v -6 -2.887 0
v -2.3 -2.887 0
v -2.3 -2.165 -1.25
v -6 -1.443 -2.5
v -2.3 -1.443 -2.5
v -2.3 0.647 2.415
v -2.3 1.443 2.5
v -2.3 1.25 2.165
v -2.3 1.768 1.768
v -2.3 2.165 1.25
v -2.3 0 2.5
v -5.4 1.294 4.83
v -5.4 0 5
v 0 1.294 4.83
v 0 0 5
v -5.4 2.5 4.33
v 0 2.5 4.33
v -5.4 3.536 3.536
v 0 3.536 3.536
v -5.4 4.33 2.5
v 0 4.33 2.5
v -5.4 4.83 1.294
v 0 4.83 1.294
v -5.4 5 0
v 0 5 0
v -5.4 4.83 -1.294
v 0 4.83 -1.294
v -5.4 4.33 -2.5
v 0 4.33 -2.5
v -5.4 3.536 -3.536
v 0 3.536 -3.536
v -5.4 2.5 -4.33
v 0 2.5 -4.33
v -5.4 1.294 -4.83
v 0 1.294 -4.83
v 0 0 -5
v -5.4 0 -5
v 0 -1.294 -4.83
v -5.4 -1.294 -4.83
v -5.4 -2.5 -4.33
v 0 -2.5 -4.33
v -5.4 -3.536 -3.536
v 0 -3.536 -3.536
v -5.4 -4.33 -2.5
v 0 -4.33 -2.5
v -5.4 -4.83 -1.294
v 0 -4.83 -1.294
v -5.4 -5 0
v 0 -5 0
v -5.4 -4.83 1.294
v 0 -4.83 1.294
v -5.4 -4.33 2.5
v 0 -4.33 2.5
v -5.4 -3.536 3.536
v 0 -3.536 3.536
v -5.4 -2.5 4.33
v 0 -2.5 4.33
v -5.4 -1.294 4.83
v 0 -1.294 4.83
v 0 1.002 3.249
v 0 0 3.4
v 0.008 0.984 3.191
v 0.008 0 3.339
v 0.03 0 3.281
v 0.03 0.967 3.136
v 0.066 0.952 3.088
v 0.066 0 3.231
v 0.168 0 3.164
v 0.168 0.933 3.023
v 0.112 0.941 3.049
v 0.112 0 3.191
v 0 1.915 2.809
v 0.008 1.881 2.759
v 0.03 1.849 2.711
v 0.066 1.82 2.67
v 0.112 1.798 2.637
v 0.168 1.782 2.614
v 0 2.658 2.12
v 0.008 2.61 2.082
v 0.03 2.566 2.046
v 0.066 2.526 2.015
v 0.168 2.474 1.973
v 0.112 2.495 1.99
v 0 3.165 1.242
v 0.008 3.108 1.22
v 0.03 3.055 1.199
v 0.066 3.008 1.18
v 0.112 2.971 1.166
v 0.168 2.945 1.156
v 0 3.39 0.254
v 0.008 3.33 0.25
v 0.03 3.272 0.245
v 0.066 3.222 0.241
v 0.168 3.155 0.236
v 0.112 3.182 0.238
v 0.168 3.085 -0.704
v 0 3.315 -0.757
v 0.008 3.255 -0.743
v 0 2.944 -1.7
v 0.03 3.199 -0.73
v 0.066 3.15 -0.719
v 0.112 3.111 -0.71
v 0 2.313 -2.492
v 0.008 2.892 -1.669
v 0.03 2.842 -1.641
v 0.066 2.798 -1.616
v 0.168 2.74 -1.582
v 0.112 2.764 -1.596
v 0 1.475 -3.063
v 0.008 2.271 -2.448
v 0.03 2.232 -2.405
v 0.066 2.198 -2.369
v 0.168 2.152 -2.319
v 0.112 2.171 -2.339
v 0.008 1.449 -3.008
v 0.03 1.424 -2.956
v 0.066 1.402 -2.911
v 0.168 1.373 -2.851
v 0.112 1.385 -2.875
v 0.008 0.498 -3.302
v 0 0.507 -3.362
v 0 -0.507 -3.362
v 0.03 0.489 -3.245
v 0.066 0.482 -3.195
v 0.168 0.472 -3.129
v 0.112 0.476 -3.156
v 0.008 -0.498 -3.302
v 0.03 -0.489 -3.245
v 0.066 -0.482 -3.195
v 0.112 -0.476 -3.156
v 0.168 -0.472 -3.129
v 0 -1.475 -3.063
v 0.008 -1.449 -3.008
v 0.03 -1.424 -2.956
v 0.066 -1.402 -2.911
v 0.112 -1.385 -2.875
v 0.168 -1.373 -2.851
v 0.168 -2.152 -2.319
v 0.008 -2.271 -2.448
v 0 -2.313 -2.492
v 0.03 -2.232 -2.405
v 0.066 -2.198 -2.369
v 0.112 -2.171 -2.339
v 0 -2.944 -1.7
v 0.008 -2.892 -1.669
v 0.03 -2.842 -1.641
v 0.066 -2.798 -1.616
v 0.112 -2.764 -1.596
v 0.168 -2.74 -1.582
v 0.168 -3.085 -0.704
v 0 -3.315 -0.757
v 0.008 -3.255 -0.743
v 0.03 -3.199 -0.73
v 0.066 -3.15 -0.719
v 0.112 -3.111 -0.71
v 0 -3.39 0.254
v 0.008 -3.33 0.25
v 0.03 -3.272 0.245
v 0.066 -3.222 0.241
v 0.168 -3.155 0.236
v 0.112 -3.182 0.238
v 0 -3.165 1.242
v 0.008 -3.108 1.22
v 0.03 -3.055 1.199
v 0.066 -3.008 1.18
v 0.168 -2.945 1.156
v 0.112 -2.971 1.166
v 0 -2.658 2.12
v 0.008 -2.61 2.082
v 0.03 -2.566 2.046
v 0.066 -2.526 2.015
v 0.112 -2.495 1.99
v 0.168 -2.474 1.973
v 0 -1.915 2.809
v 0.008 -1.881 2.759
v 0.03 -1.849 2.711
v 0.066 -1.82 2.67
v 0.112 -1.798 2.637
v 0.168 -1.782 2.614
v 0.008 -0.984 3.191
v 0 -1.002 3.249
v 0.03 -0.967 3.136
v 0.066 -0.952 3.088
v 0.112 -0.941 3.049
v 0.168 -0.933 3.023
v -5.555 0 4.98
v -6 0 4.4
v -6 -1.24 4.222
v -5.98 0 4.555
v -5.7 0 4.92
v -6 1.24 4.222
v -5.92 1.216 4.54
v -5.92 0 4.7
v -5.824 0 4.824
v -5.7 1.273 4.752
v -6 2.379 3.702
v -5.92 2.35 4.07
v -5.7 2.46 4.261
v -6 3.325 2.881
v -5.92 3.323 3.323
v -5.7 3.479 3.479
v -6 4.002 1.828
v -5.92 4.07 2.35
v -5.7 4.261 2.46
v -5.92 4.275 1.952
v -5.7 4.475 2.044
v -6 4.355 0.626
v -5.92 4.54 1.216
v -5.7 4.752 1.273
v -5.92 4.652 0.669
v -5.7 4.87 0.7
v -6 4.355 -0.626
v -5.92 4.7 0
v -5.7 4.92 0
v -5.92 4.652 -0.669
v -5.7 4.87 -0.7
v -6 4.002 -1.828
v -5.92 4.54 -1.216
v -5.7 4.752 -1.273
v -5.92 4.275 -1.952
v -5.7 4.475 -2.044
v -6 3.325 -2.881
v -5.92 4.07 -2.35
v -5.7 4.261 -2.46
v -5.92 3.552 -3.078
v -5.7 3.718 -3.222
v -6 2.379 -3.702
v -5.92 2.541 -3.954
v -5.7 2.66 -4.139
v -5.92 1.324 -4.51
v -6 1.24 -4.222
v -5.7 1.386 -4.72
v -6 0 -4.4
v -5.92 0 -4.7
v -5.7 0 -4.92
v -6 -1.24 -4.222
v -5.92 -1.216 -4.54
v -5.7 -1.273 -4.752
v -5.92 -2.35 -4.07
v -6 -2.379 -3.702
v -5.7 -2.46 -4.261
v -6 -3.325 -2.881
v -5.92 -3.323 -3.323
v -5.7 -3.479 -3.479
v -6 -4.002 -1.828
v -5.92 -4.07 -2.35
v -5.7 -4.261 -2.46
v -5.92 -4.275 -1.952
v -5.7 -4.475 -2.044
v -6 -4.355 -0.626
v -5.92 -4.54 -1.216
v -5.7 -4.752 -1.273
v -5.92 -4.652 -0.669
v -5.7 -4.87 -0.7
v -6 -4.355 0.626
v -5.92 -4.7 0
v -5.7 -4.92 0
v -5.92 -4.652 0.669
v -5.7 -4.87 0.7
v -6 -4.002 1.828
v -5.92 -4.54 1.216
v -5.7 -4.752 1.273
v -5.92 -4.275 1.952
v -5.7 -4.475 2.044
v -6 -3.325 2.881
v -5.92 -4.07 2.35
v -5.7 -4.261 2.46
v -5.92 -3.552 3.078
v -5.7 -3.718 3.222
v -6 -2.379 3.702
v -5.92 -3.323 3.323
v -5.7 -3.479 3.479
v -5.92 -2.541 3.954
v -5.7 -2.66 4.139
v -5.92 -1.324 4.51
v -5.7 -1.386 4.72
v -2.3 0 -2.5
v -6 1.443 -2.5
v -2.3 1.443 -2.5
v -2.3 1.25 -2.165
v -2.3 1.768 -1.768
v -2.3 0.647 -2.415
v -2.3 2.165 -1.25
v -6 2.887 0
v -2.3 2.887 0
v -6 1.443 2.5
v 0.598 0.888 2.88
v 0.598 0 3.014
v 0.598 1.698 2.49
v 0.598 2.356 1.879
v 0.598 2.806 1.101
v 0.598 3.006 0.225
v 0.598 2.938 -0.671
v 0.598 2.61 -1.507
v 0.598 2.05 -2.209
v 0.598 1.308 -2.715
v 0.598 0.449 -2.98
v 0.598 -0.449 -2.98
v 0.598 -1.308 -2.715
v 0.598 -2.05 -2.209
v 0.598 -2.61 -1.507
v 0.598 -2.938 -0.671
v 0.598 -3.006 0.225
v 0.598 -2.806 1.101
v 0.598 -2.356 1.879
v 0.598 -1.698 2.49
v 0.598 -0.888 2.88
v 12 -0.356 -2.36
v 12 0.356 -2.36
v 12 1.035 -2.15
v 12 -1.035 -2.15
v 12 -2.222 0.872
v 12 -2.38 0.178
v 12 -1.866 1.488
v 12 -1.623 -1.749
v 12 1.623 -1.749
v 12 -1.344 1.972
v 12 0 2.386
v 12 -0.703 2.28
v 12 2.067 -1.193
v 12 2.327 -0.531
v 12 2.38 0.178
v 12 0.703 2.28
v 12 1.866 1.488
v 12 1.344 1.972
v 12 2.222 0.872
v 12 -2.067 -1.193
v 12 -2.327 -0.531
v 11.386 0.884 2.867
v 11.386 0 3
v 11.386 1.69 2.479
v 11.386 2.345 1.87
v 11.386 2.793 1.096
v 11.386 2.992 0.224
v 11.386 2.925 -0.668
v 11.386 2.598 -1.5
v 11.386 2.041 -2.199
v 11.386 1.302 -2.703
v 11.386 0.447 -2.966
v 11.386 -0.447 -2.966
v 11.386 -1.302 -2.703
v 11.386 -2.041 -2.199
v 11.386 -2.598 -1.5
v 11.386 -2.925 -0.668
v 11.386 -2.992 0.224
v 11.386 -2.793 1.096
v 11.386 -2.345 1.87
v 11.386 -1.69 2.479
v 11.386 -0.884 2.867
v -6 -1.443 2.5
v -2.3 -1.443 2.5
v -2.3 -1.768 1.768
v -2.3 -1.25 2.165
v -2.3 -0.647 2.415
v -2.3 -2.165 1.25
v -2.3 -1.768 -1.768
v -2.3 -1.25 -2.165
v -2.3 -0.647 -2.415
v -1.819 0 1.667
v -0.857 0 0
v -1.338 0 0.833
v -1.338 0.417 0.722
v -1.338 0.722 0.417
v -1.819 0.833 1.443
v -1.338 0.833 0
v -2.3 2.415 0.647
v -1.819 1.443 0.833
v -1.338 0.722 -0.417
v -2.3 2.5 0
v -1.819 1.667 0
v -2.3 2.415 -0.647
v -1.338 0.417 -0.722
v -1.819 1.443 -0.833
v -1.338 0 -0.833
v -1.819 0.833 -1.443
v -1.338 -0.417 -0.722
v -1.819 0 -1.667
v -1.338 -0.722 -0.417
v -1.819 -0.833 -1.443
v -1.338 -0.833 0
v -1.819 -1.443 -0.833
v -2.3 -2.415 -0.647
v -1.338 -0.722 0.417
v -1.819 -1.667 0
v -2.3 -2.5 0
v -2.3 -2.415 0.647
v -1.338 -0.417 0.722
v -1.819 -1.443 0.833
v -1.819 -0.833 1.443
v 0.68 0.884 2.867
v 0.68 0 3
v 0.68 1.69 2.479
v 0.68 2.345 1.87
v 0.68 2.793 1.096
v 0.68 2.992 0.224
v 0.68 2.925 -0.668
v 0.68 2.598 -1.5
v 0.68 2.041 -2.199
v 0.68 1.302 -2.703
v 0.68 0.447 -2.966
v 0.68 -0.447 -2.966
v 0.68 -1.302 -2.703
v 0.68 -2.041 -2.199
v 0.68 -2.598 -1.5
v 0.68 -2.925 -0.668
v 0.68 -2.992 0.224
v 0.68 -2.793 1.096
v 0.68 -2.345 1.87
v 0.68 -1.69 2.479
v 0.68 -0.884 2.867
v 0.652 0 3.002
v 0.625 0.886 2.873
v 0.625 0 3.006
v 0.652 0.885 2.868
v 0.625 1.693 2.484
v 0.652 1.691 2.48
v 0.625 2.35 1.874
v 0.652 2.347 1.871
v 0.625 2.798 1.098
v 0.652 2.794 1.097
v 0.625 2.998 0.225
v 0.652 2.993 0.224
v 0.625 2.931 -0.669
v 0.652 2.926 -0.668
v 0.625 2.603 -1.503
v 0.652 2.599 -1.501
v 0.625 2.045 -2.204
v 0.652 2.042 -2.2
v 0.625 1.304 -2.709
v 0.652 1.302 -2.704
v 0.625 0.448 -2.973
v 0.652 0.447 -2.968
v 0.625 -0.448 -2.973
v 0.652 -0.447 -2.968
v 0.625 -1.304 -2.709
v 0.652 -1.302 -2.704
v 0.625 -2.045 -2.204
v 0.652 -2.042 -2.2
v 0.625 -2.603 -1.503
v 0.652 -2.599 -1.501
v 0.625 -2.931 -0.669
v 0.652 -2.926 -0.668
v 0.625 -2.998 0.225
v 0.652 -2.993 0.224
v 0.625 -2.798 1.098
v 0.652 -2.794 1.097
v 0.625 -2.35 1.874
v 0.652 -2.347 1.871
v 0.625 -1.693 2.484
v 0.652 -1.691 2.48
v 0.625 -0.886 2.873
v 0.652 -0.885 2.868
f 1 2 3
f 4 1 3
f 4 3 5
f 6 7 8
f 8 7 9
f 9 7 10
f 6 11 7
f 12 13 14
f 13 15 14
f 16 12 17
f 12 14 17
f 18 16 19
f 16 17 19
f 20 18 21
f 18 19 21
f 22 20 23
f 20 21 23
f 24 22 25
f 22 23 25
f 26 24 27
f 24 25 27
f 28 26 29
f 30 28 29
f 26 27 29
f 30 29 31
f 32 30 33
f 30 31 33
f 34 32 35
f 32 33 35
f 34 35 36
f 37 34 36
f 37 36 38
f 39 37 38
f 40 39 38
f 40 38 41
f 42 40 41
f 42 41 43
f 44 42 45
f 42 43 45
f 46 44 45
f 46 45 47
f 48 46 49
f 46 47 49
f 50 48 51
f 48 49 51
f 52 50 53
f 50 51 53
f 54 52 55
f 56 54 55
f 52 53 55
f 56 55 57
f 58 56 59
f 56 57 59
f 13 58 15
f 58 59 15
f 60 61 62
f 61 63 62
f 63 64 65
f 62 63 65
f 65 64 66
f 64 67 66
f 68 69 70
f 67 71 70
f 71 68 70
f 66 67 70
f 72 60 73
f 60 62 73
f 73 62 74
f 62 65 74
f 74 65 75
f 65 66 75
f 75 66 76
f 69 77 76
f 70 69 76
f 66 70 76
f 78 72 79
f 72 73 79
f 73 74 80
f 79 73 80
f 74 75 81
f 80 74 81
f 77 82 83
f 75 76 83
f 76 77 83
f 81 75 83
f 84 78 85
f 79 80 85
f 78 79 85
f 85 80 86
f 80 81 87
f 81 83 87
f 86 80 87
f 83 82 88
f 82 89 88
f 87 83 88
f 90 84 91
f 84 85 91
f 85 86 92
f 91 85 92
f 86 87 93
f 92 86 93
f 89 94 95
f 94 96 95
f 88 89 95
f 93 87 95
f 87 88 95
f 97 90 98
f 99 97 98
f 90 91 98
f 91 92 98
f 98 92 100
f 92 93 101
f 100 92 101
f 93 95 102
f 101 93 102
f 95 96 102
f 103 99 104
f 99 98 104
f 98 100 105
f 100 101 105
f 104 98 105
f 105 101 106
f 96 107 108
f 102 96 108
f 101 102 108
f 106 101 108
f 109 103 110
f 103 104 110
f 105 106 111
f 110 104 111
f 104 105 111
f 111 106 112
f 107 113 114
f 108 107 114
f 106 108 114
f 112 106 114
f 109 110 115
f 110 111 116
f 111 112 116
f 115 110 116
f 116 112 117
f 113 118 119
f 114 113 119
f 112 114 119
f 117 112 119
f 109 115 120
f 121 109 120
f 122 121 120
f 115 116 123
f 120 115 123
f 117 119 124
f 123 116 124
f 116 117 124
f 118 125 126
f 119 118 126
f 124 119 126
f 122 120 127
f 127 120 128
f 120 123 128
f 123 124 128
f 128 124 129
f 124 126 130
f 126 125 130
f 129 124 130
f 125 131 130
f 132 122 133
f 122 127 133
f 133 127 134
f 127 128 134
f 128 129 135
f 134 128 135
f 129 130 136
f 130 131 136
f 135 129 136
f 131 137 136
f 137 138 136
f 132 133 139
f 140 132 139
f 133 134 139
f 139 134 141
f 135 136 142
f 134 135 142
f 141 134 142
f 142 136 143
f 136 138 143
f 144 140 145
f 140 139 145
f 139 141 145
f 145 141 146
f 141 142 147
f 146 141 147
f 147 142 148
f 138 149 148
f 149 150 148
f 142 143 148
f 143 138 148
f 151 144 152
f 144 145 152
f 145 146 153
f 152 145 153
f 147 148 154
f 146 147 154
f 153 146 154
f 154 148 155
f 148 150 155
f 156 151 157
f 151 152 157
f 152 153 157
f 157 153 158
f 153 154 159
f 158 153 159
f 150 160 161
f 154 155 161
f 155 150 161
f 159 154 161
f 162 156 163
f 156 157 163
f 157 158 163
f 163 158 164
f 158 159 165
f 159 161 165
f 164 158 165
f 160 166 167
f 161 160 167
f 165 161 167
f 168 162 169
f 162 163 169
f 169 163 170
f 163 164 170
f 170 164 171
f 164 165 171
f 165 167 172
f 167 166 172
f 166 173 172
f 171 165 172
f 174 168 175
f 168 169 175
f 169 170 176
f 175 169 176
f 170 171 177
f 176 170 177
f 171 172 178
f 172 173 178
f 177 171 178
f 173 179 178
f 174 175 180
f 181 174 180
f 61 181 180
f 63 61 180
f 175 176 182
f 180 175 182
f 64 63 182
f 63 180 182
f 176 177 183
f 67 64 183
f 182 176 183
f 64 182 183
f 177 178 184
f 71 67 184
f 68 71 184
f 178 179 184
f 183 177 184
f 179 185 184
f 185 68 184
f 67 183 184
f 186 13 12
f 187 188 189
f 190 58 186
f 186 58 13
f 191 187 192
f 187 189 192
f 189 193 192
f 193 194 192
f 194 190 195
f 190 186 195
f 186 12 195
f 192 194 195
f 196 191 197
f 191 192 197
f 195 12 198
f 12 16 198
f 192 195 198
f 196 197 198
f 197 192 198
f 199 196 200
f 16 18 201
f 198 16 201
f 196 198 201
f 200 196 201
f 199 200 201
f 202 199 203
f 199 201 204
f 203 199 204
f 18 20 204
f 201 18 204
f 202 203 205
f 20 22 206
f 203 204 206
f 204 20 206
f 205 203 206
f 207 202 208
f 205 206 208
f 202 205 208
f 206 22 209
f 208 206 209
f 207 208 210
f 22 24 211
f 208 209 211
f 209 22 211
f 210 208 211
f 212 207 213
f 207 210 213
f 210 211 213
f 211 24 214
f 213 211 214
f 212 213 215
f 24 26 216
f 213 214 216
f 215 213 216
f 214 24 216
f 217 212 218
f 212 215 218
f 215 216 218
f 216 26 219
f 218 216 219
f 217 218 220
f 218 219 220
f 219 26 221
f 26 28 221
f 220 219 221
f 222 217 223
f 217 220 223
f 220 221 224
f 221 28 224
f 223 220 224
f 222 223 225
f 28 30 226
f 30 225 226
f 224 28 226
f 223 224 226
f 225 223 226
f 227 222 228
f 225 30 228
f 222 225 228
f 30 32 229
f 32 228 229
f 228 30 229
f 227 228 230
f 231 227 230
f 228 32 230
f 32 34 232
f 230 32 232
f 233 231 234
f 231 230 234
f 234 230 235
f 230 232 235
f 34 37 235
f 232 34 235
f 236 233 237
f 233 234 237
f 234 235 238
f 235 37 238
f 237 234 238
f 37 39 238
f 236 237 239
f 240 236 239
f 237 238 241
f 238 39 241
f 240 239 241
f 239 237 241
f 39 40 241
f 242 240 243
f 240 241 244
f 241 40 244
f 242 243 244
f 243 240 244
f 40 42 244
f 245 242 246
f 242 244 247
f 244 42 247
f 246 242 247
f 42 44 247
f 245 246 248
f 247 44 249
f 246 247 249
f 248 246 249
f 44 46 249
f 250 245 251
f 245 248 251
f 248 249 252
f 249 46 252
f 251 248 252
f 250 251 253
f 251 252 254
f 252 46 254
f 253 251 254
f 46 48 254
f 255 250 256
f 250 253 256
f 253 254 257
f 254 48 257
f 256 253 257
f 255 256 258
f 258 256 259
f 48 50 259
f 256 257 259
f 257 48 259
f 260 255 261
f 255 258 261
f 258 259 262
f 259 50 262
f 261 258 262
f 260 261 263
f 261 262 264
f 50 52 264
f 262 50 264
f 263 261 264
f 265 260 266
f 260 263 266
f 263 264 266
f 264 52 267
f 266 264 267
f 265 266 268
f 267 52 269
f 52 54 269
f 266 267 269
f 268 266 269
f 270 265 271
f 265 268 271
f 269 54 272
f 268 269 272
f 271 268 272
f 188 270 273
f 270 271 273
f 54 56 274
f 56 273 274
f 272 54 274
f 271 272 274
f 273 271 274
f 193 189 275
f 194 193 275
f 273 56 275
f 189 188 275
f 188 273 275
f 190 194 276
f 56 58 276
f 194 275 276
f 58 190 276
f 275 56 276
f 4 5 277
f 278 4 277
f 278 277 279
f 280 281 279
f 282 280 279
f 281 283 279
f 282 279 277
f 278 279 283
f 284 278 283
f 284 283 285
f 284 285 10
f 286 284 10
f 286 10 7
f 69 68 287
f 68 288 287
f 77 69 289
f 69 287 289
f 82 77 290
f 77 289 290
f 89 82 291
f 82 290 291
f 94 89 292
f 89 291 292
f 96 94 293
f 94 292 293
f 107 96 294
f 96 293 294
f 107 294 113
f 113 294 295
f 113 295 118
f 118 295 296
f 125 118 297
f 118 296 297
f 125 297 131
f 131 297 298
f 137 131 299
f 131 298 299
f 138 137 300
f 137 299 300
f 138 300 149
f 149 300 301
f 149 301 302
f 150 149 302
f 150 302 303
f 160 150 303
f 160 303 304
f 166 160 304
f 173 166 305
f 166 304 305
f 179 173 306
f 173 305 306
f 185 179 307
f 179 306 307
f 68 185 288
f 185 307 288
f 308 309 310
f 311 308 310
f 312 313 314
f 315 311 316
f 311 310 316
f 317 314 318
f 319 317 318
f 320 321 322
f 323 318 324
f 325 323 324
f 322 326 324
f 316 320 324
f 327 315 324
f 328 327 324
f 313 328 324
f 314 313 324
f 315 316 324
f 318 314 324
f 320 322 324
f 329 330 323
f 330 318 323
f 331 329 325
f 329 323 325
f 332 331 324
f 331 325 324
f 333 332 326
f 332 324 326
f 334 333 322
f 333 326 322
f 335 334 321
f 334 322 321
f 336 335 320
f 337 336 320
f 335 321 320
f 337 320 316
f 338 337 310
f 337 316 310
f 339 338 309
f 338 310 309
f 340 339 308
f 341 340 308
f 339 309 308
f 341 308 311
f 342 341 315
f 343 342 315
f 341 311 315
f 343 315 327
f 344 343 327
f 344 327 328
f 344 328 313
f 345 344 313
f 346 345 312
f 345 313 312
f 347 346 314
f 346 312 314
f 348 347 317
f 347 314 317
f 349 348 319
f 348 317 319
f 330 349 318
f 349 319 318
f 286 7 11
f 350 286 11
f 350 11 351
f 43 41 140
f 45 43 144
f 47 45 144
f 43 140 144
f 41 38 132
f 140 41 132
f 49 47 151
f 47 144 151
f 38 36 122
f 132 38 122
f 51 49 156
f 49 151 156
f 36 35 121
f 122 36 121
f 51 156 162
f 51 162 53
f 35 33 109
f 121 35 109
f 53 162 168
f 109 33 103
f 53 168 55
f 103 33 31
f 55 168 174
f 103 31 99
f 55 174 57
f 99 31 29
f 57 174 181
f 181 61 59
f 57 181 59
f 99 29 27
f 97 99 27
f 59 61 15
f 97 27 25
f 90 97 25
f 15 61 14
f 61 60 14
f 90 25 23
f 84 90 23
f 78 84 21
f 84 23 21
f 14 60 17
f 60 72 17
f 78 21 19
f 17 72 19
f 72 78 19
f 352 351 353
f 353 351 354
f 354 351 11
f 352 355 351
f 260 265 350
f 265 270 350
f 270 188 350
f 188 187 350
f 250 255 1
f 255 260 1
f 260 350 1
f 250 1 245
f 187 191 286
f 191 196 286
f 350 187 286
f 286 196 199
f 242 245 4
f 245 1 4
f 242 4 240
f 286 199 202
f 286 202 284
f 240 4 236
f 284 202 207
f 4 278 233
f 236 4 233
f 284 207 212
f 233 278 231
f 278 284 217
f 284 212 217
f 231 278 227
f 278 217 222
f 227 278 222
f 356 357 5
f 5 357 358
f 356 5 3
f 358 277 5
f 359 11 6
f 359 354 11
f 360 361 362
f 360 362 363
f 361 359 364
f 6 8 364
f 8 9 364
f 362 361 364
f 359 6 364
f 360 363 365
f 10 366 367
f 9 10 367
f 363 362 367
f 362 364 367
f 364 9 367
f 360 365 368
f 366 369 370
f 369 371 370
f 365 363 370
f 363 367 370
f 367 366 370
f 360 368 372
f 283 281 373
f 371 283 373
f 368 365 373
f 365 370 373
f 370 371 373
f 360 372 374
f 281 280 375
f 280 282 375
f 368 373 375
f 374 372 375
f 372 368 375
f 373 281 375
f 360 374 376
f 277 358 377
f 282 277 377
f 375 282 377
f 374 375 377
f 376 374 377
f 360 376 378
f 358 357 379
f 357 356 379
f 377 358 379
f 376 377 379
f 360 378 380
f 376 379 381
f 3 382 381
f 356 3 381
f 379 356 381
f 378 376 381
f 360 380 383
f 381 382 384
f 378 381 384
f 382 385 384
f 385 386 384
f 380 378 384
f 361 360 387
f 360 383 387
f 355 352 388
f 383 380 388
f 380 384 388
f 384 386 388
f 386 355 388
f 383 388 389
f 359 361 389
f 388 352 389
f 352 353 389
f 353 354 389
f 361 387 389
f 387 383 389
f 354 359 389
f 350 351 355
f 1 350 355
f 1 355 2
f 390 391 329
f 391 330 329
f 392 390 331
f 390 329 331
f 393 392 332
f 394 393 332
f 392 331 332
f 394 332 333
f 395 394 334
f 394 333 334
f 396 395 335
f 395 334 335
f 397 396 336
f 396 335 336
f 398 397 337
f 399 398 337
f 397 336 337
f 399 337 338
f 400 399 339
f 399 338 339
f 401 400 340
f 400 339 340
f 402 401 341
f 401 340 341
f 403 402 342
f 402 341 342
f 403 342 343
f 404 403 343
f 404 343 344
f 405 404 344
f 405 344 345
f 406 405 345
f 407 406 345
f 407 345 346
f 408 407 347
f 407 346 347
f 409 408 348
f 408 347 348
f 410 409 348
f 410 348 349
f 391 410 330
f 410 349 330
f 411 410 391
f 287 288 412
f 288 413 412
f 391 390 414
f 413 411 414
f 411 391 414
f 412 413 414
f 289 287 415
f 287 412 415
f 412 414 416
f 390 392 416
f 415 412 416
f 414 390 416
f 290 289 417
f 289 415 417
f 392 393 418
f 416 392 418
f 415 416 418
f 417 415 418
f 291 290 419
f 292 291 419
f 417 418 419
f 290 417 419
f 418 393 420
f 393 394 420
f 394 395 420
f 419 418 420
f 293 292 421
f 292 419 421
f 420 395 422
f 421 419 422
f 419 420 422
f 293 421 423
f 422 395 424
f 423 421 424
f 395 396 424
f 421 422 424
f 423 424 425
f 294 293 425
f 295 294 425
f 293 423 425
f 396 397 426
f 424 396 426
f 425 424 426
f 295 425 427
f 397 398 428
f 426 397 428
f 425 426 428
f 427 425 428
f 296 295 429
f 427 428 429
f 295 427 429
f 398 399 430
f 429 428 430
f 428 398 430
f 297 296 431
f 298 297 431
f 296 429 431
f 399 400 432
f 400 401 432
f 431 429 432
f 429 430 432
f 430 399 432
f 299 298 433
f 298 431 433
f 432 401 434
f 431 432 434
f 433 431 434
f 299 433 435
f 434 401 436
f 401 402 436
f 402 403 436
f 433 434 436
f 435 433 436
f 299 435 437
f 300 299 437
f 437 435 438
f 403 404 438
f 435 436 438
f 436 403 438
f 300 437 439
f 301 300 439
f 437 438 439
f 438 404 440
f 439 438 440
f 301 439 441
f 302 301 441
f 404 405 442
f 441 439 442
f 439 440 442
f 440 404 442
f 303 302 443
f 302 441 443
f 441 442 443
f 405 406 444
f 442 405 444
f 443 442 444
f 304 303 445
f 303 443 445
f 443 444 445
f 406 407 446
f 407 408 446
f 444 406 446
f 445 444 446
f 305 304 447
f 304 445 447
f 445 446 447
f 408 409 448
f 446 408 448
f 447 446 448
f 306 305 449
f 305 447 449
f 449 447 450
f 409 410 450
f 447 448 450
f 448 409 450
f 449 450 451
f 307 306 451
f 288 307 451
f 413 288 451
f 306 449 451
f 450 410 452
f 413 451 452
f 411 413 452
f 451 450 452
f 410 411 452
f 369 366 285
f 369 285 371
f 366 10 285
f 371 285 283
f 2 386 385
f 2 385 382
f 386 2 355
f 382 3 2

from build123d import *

# Parameters (mm, degrees)
CUT_EXTRUDE_1_DEPTH = 6
SKETCH_3_R          = 3.75
EXTRUDE_1_DEPTH     = 3


with BuildPart() as part:
    # 草图1 → 旋转1 (revolve)
    with BuildSketch(Plane.XY, mode=Mode.PRIVATE) as revolve_1_sk:
        with BuildLine():
            Line((-0.856624327, 0), (-2.3, 2.5))
            Line((-2.3, 2.5), (-6, 2.5))
            Line((-6, 2.5), (-6, 4.4))
            ThreePointArc((-6, 4.4), (-5.824264069, 4.824264069), (-5.4, 5))
            Line((-5.4, 5), (0, 5))
            Line((0, 5), (0, 3.4))
            ThreePointArc((0, 3.4), (0.046179295, 3.255234258), (0.167656961, 3.163949955))
            Line((0.167656961, 3.163949955), (0.597656961, 3.013949955))
            ThreePointArc((0.597656961, 3.013949955), (0.638241835, 3.003512159), (0.68, 3))
            Line((0.68, 3), (11.3865, 3))
            Line((11.3865, 3), (12, 2.3865))
            Line((12, 2.3865), (12, 0))
            Line((12, 0), (-0.856624327, 0))
        make_face()
    revolve(revolve_1_sk.sketch.rotate(Axis((12, 0, 0), (-1, 0, 0)), 270), axis=Axis((12, 0, 0), (-1, 0, 0)))

    # 草图2 → 切除-拉伸1 (cut)
    with BuildSketch(Plane(origin=(-2.3, 0, 0), x_dir=(0, 0, -1), z_dir=(1, 0, 0))):
        Polygon((-2.5, 1.443375673), (-2.5, -1.443375673), (0, -2.886751346), (2.5, -1.443375673), (2.5, 1.443375673), (0, 2.886751346), align=None)
    extrude(amount=-CUT_EXTRUDE_1_DEPTH, mode=Mode.SUBTRACT)


with BuildPart() as body_2:
    # 草图3 → 凸台-拉伸1 (new body)
    with BuildSketch(Plane(origin=(0, 0, 0), x_dir=(0, 0, -1), z_dir=(1, 0, 0))):
        Circle(SKETCH_3_R)
    extrude(amount=-EXTRUDE_1_DEPTH)

    # Delete Face 1: 1 face struck out; the rest of the skin is kept as a surface, the solid goes
    delete_face_1_1_drop = [body_2.part.faces().sort_by_distance(Vector(p))[0] for p in ((-3, 0, 0),)]
    delete_face_1_1 = Shell(body_2.part.faces() - delete_face_1_1_drop)


solid = part.part
